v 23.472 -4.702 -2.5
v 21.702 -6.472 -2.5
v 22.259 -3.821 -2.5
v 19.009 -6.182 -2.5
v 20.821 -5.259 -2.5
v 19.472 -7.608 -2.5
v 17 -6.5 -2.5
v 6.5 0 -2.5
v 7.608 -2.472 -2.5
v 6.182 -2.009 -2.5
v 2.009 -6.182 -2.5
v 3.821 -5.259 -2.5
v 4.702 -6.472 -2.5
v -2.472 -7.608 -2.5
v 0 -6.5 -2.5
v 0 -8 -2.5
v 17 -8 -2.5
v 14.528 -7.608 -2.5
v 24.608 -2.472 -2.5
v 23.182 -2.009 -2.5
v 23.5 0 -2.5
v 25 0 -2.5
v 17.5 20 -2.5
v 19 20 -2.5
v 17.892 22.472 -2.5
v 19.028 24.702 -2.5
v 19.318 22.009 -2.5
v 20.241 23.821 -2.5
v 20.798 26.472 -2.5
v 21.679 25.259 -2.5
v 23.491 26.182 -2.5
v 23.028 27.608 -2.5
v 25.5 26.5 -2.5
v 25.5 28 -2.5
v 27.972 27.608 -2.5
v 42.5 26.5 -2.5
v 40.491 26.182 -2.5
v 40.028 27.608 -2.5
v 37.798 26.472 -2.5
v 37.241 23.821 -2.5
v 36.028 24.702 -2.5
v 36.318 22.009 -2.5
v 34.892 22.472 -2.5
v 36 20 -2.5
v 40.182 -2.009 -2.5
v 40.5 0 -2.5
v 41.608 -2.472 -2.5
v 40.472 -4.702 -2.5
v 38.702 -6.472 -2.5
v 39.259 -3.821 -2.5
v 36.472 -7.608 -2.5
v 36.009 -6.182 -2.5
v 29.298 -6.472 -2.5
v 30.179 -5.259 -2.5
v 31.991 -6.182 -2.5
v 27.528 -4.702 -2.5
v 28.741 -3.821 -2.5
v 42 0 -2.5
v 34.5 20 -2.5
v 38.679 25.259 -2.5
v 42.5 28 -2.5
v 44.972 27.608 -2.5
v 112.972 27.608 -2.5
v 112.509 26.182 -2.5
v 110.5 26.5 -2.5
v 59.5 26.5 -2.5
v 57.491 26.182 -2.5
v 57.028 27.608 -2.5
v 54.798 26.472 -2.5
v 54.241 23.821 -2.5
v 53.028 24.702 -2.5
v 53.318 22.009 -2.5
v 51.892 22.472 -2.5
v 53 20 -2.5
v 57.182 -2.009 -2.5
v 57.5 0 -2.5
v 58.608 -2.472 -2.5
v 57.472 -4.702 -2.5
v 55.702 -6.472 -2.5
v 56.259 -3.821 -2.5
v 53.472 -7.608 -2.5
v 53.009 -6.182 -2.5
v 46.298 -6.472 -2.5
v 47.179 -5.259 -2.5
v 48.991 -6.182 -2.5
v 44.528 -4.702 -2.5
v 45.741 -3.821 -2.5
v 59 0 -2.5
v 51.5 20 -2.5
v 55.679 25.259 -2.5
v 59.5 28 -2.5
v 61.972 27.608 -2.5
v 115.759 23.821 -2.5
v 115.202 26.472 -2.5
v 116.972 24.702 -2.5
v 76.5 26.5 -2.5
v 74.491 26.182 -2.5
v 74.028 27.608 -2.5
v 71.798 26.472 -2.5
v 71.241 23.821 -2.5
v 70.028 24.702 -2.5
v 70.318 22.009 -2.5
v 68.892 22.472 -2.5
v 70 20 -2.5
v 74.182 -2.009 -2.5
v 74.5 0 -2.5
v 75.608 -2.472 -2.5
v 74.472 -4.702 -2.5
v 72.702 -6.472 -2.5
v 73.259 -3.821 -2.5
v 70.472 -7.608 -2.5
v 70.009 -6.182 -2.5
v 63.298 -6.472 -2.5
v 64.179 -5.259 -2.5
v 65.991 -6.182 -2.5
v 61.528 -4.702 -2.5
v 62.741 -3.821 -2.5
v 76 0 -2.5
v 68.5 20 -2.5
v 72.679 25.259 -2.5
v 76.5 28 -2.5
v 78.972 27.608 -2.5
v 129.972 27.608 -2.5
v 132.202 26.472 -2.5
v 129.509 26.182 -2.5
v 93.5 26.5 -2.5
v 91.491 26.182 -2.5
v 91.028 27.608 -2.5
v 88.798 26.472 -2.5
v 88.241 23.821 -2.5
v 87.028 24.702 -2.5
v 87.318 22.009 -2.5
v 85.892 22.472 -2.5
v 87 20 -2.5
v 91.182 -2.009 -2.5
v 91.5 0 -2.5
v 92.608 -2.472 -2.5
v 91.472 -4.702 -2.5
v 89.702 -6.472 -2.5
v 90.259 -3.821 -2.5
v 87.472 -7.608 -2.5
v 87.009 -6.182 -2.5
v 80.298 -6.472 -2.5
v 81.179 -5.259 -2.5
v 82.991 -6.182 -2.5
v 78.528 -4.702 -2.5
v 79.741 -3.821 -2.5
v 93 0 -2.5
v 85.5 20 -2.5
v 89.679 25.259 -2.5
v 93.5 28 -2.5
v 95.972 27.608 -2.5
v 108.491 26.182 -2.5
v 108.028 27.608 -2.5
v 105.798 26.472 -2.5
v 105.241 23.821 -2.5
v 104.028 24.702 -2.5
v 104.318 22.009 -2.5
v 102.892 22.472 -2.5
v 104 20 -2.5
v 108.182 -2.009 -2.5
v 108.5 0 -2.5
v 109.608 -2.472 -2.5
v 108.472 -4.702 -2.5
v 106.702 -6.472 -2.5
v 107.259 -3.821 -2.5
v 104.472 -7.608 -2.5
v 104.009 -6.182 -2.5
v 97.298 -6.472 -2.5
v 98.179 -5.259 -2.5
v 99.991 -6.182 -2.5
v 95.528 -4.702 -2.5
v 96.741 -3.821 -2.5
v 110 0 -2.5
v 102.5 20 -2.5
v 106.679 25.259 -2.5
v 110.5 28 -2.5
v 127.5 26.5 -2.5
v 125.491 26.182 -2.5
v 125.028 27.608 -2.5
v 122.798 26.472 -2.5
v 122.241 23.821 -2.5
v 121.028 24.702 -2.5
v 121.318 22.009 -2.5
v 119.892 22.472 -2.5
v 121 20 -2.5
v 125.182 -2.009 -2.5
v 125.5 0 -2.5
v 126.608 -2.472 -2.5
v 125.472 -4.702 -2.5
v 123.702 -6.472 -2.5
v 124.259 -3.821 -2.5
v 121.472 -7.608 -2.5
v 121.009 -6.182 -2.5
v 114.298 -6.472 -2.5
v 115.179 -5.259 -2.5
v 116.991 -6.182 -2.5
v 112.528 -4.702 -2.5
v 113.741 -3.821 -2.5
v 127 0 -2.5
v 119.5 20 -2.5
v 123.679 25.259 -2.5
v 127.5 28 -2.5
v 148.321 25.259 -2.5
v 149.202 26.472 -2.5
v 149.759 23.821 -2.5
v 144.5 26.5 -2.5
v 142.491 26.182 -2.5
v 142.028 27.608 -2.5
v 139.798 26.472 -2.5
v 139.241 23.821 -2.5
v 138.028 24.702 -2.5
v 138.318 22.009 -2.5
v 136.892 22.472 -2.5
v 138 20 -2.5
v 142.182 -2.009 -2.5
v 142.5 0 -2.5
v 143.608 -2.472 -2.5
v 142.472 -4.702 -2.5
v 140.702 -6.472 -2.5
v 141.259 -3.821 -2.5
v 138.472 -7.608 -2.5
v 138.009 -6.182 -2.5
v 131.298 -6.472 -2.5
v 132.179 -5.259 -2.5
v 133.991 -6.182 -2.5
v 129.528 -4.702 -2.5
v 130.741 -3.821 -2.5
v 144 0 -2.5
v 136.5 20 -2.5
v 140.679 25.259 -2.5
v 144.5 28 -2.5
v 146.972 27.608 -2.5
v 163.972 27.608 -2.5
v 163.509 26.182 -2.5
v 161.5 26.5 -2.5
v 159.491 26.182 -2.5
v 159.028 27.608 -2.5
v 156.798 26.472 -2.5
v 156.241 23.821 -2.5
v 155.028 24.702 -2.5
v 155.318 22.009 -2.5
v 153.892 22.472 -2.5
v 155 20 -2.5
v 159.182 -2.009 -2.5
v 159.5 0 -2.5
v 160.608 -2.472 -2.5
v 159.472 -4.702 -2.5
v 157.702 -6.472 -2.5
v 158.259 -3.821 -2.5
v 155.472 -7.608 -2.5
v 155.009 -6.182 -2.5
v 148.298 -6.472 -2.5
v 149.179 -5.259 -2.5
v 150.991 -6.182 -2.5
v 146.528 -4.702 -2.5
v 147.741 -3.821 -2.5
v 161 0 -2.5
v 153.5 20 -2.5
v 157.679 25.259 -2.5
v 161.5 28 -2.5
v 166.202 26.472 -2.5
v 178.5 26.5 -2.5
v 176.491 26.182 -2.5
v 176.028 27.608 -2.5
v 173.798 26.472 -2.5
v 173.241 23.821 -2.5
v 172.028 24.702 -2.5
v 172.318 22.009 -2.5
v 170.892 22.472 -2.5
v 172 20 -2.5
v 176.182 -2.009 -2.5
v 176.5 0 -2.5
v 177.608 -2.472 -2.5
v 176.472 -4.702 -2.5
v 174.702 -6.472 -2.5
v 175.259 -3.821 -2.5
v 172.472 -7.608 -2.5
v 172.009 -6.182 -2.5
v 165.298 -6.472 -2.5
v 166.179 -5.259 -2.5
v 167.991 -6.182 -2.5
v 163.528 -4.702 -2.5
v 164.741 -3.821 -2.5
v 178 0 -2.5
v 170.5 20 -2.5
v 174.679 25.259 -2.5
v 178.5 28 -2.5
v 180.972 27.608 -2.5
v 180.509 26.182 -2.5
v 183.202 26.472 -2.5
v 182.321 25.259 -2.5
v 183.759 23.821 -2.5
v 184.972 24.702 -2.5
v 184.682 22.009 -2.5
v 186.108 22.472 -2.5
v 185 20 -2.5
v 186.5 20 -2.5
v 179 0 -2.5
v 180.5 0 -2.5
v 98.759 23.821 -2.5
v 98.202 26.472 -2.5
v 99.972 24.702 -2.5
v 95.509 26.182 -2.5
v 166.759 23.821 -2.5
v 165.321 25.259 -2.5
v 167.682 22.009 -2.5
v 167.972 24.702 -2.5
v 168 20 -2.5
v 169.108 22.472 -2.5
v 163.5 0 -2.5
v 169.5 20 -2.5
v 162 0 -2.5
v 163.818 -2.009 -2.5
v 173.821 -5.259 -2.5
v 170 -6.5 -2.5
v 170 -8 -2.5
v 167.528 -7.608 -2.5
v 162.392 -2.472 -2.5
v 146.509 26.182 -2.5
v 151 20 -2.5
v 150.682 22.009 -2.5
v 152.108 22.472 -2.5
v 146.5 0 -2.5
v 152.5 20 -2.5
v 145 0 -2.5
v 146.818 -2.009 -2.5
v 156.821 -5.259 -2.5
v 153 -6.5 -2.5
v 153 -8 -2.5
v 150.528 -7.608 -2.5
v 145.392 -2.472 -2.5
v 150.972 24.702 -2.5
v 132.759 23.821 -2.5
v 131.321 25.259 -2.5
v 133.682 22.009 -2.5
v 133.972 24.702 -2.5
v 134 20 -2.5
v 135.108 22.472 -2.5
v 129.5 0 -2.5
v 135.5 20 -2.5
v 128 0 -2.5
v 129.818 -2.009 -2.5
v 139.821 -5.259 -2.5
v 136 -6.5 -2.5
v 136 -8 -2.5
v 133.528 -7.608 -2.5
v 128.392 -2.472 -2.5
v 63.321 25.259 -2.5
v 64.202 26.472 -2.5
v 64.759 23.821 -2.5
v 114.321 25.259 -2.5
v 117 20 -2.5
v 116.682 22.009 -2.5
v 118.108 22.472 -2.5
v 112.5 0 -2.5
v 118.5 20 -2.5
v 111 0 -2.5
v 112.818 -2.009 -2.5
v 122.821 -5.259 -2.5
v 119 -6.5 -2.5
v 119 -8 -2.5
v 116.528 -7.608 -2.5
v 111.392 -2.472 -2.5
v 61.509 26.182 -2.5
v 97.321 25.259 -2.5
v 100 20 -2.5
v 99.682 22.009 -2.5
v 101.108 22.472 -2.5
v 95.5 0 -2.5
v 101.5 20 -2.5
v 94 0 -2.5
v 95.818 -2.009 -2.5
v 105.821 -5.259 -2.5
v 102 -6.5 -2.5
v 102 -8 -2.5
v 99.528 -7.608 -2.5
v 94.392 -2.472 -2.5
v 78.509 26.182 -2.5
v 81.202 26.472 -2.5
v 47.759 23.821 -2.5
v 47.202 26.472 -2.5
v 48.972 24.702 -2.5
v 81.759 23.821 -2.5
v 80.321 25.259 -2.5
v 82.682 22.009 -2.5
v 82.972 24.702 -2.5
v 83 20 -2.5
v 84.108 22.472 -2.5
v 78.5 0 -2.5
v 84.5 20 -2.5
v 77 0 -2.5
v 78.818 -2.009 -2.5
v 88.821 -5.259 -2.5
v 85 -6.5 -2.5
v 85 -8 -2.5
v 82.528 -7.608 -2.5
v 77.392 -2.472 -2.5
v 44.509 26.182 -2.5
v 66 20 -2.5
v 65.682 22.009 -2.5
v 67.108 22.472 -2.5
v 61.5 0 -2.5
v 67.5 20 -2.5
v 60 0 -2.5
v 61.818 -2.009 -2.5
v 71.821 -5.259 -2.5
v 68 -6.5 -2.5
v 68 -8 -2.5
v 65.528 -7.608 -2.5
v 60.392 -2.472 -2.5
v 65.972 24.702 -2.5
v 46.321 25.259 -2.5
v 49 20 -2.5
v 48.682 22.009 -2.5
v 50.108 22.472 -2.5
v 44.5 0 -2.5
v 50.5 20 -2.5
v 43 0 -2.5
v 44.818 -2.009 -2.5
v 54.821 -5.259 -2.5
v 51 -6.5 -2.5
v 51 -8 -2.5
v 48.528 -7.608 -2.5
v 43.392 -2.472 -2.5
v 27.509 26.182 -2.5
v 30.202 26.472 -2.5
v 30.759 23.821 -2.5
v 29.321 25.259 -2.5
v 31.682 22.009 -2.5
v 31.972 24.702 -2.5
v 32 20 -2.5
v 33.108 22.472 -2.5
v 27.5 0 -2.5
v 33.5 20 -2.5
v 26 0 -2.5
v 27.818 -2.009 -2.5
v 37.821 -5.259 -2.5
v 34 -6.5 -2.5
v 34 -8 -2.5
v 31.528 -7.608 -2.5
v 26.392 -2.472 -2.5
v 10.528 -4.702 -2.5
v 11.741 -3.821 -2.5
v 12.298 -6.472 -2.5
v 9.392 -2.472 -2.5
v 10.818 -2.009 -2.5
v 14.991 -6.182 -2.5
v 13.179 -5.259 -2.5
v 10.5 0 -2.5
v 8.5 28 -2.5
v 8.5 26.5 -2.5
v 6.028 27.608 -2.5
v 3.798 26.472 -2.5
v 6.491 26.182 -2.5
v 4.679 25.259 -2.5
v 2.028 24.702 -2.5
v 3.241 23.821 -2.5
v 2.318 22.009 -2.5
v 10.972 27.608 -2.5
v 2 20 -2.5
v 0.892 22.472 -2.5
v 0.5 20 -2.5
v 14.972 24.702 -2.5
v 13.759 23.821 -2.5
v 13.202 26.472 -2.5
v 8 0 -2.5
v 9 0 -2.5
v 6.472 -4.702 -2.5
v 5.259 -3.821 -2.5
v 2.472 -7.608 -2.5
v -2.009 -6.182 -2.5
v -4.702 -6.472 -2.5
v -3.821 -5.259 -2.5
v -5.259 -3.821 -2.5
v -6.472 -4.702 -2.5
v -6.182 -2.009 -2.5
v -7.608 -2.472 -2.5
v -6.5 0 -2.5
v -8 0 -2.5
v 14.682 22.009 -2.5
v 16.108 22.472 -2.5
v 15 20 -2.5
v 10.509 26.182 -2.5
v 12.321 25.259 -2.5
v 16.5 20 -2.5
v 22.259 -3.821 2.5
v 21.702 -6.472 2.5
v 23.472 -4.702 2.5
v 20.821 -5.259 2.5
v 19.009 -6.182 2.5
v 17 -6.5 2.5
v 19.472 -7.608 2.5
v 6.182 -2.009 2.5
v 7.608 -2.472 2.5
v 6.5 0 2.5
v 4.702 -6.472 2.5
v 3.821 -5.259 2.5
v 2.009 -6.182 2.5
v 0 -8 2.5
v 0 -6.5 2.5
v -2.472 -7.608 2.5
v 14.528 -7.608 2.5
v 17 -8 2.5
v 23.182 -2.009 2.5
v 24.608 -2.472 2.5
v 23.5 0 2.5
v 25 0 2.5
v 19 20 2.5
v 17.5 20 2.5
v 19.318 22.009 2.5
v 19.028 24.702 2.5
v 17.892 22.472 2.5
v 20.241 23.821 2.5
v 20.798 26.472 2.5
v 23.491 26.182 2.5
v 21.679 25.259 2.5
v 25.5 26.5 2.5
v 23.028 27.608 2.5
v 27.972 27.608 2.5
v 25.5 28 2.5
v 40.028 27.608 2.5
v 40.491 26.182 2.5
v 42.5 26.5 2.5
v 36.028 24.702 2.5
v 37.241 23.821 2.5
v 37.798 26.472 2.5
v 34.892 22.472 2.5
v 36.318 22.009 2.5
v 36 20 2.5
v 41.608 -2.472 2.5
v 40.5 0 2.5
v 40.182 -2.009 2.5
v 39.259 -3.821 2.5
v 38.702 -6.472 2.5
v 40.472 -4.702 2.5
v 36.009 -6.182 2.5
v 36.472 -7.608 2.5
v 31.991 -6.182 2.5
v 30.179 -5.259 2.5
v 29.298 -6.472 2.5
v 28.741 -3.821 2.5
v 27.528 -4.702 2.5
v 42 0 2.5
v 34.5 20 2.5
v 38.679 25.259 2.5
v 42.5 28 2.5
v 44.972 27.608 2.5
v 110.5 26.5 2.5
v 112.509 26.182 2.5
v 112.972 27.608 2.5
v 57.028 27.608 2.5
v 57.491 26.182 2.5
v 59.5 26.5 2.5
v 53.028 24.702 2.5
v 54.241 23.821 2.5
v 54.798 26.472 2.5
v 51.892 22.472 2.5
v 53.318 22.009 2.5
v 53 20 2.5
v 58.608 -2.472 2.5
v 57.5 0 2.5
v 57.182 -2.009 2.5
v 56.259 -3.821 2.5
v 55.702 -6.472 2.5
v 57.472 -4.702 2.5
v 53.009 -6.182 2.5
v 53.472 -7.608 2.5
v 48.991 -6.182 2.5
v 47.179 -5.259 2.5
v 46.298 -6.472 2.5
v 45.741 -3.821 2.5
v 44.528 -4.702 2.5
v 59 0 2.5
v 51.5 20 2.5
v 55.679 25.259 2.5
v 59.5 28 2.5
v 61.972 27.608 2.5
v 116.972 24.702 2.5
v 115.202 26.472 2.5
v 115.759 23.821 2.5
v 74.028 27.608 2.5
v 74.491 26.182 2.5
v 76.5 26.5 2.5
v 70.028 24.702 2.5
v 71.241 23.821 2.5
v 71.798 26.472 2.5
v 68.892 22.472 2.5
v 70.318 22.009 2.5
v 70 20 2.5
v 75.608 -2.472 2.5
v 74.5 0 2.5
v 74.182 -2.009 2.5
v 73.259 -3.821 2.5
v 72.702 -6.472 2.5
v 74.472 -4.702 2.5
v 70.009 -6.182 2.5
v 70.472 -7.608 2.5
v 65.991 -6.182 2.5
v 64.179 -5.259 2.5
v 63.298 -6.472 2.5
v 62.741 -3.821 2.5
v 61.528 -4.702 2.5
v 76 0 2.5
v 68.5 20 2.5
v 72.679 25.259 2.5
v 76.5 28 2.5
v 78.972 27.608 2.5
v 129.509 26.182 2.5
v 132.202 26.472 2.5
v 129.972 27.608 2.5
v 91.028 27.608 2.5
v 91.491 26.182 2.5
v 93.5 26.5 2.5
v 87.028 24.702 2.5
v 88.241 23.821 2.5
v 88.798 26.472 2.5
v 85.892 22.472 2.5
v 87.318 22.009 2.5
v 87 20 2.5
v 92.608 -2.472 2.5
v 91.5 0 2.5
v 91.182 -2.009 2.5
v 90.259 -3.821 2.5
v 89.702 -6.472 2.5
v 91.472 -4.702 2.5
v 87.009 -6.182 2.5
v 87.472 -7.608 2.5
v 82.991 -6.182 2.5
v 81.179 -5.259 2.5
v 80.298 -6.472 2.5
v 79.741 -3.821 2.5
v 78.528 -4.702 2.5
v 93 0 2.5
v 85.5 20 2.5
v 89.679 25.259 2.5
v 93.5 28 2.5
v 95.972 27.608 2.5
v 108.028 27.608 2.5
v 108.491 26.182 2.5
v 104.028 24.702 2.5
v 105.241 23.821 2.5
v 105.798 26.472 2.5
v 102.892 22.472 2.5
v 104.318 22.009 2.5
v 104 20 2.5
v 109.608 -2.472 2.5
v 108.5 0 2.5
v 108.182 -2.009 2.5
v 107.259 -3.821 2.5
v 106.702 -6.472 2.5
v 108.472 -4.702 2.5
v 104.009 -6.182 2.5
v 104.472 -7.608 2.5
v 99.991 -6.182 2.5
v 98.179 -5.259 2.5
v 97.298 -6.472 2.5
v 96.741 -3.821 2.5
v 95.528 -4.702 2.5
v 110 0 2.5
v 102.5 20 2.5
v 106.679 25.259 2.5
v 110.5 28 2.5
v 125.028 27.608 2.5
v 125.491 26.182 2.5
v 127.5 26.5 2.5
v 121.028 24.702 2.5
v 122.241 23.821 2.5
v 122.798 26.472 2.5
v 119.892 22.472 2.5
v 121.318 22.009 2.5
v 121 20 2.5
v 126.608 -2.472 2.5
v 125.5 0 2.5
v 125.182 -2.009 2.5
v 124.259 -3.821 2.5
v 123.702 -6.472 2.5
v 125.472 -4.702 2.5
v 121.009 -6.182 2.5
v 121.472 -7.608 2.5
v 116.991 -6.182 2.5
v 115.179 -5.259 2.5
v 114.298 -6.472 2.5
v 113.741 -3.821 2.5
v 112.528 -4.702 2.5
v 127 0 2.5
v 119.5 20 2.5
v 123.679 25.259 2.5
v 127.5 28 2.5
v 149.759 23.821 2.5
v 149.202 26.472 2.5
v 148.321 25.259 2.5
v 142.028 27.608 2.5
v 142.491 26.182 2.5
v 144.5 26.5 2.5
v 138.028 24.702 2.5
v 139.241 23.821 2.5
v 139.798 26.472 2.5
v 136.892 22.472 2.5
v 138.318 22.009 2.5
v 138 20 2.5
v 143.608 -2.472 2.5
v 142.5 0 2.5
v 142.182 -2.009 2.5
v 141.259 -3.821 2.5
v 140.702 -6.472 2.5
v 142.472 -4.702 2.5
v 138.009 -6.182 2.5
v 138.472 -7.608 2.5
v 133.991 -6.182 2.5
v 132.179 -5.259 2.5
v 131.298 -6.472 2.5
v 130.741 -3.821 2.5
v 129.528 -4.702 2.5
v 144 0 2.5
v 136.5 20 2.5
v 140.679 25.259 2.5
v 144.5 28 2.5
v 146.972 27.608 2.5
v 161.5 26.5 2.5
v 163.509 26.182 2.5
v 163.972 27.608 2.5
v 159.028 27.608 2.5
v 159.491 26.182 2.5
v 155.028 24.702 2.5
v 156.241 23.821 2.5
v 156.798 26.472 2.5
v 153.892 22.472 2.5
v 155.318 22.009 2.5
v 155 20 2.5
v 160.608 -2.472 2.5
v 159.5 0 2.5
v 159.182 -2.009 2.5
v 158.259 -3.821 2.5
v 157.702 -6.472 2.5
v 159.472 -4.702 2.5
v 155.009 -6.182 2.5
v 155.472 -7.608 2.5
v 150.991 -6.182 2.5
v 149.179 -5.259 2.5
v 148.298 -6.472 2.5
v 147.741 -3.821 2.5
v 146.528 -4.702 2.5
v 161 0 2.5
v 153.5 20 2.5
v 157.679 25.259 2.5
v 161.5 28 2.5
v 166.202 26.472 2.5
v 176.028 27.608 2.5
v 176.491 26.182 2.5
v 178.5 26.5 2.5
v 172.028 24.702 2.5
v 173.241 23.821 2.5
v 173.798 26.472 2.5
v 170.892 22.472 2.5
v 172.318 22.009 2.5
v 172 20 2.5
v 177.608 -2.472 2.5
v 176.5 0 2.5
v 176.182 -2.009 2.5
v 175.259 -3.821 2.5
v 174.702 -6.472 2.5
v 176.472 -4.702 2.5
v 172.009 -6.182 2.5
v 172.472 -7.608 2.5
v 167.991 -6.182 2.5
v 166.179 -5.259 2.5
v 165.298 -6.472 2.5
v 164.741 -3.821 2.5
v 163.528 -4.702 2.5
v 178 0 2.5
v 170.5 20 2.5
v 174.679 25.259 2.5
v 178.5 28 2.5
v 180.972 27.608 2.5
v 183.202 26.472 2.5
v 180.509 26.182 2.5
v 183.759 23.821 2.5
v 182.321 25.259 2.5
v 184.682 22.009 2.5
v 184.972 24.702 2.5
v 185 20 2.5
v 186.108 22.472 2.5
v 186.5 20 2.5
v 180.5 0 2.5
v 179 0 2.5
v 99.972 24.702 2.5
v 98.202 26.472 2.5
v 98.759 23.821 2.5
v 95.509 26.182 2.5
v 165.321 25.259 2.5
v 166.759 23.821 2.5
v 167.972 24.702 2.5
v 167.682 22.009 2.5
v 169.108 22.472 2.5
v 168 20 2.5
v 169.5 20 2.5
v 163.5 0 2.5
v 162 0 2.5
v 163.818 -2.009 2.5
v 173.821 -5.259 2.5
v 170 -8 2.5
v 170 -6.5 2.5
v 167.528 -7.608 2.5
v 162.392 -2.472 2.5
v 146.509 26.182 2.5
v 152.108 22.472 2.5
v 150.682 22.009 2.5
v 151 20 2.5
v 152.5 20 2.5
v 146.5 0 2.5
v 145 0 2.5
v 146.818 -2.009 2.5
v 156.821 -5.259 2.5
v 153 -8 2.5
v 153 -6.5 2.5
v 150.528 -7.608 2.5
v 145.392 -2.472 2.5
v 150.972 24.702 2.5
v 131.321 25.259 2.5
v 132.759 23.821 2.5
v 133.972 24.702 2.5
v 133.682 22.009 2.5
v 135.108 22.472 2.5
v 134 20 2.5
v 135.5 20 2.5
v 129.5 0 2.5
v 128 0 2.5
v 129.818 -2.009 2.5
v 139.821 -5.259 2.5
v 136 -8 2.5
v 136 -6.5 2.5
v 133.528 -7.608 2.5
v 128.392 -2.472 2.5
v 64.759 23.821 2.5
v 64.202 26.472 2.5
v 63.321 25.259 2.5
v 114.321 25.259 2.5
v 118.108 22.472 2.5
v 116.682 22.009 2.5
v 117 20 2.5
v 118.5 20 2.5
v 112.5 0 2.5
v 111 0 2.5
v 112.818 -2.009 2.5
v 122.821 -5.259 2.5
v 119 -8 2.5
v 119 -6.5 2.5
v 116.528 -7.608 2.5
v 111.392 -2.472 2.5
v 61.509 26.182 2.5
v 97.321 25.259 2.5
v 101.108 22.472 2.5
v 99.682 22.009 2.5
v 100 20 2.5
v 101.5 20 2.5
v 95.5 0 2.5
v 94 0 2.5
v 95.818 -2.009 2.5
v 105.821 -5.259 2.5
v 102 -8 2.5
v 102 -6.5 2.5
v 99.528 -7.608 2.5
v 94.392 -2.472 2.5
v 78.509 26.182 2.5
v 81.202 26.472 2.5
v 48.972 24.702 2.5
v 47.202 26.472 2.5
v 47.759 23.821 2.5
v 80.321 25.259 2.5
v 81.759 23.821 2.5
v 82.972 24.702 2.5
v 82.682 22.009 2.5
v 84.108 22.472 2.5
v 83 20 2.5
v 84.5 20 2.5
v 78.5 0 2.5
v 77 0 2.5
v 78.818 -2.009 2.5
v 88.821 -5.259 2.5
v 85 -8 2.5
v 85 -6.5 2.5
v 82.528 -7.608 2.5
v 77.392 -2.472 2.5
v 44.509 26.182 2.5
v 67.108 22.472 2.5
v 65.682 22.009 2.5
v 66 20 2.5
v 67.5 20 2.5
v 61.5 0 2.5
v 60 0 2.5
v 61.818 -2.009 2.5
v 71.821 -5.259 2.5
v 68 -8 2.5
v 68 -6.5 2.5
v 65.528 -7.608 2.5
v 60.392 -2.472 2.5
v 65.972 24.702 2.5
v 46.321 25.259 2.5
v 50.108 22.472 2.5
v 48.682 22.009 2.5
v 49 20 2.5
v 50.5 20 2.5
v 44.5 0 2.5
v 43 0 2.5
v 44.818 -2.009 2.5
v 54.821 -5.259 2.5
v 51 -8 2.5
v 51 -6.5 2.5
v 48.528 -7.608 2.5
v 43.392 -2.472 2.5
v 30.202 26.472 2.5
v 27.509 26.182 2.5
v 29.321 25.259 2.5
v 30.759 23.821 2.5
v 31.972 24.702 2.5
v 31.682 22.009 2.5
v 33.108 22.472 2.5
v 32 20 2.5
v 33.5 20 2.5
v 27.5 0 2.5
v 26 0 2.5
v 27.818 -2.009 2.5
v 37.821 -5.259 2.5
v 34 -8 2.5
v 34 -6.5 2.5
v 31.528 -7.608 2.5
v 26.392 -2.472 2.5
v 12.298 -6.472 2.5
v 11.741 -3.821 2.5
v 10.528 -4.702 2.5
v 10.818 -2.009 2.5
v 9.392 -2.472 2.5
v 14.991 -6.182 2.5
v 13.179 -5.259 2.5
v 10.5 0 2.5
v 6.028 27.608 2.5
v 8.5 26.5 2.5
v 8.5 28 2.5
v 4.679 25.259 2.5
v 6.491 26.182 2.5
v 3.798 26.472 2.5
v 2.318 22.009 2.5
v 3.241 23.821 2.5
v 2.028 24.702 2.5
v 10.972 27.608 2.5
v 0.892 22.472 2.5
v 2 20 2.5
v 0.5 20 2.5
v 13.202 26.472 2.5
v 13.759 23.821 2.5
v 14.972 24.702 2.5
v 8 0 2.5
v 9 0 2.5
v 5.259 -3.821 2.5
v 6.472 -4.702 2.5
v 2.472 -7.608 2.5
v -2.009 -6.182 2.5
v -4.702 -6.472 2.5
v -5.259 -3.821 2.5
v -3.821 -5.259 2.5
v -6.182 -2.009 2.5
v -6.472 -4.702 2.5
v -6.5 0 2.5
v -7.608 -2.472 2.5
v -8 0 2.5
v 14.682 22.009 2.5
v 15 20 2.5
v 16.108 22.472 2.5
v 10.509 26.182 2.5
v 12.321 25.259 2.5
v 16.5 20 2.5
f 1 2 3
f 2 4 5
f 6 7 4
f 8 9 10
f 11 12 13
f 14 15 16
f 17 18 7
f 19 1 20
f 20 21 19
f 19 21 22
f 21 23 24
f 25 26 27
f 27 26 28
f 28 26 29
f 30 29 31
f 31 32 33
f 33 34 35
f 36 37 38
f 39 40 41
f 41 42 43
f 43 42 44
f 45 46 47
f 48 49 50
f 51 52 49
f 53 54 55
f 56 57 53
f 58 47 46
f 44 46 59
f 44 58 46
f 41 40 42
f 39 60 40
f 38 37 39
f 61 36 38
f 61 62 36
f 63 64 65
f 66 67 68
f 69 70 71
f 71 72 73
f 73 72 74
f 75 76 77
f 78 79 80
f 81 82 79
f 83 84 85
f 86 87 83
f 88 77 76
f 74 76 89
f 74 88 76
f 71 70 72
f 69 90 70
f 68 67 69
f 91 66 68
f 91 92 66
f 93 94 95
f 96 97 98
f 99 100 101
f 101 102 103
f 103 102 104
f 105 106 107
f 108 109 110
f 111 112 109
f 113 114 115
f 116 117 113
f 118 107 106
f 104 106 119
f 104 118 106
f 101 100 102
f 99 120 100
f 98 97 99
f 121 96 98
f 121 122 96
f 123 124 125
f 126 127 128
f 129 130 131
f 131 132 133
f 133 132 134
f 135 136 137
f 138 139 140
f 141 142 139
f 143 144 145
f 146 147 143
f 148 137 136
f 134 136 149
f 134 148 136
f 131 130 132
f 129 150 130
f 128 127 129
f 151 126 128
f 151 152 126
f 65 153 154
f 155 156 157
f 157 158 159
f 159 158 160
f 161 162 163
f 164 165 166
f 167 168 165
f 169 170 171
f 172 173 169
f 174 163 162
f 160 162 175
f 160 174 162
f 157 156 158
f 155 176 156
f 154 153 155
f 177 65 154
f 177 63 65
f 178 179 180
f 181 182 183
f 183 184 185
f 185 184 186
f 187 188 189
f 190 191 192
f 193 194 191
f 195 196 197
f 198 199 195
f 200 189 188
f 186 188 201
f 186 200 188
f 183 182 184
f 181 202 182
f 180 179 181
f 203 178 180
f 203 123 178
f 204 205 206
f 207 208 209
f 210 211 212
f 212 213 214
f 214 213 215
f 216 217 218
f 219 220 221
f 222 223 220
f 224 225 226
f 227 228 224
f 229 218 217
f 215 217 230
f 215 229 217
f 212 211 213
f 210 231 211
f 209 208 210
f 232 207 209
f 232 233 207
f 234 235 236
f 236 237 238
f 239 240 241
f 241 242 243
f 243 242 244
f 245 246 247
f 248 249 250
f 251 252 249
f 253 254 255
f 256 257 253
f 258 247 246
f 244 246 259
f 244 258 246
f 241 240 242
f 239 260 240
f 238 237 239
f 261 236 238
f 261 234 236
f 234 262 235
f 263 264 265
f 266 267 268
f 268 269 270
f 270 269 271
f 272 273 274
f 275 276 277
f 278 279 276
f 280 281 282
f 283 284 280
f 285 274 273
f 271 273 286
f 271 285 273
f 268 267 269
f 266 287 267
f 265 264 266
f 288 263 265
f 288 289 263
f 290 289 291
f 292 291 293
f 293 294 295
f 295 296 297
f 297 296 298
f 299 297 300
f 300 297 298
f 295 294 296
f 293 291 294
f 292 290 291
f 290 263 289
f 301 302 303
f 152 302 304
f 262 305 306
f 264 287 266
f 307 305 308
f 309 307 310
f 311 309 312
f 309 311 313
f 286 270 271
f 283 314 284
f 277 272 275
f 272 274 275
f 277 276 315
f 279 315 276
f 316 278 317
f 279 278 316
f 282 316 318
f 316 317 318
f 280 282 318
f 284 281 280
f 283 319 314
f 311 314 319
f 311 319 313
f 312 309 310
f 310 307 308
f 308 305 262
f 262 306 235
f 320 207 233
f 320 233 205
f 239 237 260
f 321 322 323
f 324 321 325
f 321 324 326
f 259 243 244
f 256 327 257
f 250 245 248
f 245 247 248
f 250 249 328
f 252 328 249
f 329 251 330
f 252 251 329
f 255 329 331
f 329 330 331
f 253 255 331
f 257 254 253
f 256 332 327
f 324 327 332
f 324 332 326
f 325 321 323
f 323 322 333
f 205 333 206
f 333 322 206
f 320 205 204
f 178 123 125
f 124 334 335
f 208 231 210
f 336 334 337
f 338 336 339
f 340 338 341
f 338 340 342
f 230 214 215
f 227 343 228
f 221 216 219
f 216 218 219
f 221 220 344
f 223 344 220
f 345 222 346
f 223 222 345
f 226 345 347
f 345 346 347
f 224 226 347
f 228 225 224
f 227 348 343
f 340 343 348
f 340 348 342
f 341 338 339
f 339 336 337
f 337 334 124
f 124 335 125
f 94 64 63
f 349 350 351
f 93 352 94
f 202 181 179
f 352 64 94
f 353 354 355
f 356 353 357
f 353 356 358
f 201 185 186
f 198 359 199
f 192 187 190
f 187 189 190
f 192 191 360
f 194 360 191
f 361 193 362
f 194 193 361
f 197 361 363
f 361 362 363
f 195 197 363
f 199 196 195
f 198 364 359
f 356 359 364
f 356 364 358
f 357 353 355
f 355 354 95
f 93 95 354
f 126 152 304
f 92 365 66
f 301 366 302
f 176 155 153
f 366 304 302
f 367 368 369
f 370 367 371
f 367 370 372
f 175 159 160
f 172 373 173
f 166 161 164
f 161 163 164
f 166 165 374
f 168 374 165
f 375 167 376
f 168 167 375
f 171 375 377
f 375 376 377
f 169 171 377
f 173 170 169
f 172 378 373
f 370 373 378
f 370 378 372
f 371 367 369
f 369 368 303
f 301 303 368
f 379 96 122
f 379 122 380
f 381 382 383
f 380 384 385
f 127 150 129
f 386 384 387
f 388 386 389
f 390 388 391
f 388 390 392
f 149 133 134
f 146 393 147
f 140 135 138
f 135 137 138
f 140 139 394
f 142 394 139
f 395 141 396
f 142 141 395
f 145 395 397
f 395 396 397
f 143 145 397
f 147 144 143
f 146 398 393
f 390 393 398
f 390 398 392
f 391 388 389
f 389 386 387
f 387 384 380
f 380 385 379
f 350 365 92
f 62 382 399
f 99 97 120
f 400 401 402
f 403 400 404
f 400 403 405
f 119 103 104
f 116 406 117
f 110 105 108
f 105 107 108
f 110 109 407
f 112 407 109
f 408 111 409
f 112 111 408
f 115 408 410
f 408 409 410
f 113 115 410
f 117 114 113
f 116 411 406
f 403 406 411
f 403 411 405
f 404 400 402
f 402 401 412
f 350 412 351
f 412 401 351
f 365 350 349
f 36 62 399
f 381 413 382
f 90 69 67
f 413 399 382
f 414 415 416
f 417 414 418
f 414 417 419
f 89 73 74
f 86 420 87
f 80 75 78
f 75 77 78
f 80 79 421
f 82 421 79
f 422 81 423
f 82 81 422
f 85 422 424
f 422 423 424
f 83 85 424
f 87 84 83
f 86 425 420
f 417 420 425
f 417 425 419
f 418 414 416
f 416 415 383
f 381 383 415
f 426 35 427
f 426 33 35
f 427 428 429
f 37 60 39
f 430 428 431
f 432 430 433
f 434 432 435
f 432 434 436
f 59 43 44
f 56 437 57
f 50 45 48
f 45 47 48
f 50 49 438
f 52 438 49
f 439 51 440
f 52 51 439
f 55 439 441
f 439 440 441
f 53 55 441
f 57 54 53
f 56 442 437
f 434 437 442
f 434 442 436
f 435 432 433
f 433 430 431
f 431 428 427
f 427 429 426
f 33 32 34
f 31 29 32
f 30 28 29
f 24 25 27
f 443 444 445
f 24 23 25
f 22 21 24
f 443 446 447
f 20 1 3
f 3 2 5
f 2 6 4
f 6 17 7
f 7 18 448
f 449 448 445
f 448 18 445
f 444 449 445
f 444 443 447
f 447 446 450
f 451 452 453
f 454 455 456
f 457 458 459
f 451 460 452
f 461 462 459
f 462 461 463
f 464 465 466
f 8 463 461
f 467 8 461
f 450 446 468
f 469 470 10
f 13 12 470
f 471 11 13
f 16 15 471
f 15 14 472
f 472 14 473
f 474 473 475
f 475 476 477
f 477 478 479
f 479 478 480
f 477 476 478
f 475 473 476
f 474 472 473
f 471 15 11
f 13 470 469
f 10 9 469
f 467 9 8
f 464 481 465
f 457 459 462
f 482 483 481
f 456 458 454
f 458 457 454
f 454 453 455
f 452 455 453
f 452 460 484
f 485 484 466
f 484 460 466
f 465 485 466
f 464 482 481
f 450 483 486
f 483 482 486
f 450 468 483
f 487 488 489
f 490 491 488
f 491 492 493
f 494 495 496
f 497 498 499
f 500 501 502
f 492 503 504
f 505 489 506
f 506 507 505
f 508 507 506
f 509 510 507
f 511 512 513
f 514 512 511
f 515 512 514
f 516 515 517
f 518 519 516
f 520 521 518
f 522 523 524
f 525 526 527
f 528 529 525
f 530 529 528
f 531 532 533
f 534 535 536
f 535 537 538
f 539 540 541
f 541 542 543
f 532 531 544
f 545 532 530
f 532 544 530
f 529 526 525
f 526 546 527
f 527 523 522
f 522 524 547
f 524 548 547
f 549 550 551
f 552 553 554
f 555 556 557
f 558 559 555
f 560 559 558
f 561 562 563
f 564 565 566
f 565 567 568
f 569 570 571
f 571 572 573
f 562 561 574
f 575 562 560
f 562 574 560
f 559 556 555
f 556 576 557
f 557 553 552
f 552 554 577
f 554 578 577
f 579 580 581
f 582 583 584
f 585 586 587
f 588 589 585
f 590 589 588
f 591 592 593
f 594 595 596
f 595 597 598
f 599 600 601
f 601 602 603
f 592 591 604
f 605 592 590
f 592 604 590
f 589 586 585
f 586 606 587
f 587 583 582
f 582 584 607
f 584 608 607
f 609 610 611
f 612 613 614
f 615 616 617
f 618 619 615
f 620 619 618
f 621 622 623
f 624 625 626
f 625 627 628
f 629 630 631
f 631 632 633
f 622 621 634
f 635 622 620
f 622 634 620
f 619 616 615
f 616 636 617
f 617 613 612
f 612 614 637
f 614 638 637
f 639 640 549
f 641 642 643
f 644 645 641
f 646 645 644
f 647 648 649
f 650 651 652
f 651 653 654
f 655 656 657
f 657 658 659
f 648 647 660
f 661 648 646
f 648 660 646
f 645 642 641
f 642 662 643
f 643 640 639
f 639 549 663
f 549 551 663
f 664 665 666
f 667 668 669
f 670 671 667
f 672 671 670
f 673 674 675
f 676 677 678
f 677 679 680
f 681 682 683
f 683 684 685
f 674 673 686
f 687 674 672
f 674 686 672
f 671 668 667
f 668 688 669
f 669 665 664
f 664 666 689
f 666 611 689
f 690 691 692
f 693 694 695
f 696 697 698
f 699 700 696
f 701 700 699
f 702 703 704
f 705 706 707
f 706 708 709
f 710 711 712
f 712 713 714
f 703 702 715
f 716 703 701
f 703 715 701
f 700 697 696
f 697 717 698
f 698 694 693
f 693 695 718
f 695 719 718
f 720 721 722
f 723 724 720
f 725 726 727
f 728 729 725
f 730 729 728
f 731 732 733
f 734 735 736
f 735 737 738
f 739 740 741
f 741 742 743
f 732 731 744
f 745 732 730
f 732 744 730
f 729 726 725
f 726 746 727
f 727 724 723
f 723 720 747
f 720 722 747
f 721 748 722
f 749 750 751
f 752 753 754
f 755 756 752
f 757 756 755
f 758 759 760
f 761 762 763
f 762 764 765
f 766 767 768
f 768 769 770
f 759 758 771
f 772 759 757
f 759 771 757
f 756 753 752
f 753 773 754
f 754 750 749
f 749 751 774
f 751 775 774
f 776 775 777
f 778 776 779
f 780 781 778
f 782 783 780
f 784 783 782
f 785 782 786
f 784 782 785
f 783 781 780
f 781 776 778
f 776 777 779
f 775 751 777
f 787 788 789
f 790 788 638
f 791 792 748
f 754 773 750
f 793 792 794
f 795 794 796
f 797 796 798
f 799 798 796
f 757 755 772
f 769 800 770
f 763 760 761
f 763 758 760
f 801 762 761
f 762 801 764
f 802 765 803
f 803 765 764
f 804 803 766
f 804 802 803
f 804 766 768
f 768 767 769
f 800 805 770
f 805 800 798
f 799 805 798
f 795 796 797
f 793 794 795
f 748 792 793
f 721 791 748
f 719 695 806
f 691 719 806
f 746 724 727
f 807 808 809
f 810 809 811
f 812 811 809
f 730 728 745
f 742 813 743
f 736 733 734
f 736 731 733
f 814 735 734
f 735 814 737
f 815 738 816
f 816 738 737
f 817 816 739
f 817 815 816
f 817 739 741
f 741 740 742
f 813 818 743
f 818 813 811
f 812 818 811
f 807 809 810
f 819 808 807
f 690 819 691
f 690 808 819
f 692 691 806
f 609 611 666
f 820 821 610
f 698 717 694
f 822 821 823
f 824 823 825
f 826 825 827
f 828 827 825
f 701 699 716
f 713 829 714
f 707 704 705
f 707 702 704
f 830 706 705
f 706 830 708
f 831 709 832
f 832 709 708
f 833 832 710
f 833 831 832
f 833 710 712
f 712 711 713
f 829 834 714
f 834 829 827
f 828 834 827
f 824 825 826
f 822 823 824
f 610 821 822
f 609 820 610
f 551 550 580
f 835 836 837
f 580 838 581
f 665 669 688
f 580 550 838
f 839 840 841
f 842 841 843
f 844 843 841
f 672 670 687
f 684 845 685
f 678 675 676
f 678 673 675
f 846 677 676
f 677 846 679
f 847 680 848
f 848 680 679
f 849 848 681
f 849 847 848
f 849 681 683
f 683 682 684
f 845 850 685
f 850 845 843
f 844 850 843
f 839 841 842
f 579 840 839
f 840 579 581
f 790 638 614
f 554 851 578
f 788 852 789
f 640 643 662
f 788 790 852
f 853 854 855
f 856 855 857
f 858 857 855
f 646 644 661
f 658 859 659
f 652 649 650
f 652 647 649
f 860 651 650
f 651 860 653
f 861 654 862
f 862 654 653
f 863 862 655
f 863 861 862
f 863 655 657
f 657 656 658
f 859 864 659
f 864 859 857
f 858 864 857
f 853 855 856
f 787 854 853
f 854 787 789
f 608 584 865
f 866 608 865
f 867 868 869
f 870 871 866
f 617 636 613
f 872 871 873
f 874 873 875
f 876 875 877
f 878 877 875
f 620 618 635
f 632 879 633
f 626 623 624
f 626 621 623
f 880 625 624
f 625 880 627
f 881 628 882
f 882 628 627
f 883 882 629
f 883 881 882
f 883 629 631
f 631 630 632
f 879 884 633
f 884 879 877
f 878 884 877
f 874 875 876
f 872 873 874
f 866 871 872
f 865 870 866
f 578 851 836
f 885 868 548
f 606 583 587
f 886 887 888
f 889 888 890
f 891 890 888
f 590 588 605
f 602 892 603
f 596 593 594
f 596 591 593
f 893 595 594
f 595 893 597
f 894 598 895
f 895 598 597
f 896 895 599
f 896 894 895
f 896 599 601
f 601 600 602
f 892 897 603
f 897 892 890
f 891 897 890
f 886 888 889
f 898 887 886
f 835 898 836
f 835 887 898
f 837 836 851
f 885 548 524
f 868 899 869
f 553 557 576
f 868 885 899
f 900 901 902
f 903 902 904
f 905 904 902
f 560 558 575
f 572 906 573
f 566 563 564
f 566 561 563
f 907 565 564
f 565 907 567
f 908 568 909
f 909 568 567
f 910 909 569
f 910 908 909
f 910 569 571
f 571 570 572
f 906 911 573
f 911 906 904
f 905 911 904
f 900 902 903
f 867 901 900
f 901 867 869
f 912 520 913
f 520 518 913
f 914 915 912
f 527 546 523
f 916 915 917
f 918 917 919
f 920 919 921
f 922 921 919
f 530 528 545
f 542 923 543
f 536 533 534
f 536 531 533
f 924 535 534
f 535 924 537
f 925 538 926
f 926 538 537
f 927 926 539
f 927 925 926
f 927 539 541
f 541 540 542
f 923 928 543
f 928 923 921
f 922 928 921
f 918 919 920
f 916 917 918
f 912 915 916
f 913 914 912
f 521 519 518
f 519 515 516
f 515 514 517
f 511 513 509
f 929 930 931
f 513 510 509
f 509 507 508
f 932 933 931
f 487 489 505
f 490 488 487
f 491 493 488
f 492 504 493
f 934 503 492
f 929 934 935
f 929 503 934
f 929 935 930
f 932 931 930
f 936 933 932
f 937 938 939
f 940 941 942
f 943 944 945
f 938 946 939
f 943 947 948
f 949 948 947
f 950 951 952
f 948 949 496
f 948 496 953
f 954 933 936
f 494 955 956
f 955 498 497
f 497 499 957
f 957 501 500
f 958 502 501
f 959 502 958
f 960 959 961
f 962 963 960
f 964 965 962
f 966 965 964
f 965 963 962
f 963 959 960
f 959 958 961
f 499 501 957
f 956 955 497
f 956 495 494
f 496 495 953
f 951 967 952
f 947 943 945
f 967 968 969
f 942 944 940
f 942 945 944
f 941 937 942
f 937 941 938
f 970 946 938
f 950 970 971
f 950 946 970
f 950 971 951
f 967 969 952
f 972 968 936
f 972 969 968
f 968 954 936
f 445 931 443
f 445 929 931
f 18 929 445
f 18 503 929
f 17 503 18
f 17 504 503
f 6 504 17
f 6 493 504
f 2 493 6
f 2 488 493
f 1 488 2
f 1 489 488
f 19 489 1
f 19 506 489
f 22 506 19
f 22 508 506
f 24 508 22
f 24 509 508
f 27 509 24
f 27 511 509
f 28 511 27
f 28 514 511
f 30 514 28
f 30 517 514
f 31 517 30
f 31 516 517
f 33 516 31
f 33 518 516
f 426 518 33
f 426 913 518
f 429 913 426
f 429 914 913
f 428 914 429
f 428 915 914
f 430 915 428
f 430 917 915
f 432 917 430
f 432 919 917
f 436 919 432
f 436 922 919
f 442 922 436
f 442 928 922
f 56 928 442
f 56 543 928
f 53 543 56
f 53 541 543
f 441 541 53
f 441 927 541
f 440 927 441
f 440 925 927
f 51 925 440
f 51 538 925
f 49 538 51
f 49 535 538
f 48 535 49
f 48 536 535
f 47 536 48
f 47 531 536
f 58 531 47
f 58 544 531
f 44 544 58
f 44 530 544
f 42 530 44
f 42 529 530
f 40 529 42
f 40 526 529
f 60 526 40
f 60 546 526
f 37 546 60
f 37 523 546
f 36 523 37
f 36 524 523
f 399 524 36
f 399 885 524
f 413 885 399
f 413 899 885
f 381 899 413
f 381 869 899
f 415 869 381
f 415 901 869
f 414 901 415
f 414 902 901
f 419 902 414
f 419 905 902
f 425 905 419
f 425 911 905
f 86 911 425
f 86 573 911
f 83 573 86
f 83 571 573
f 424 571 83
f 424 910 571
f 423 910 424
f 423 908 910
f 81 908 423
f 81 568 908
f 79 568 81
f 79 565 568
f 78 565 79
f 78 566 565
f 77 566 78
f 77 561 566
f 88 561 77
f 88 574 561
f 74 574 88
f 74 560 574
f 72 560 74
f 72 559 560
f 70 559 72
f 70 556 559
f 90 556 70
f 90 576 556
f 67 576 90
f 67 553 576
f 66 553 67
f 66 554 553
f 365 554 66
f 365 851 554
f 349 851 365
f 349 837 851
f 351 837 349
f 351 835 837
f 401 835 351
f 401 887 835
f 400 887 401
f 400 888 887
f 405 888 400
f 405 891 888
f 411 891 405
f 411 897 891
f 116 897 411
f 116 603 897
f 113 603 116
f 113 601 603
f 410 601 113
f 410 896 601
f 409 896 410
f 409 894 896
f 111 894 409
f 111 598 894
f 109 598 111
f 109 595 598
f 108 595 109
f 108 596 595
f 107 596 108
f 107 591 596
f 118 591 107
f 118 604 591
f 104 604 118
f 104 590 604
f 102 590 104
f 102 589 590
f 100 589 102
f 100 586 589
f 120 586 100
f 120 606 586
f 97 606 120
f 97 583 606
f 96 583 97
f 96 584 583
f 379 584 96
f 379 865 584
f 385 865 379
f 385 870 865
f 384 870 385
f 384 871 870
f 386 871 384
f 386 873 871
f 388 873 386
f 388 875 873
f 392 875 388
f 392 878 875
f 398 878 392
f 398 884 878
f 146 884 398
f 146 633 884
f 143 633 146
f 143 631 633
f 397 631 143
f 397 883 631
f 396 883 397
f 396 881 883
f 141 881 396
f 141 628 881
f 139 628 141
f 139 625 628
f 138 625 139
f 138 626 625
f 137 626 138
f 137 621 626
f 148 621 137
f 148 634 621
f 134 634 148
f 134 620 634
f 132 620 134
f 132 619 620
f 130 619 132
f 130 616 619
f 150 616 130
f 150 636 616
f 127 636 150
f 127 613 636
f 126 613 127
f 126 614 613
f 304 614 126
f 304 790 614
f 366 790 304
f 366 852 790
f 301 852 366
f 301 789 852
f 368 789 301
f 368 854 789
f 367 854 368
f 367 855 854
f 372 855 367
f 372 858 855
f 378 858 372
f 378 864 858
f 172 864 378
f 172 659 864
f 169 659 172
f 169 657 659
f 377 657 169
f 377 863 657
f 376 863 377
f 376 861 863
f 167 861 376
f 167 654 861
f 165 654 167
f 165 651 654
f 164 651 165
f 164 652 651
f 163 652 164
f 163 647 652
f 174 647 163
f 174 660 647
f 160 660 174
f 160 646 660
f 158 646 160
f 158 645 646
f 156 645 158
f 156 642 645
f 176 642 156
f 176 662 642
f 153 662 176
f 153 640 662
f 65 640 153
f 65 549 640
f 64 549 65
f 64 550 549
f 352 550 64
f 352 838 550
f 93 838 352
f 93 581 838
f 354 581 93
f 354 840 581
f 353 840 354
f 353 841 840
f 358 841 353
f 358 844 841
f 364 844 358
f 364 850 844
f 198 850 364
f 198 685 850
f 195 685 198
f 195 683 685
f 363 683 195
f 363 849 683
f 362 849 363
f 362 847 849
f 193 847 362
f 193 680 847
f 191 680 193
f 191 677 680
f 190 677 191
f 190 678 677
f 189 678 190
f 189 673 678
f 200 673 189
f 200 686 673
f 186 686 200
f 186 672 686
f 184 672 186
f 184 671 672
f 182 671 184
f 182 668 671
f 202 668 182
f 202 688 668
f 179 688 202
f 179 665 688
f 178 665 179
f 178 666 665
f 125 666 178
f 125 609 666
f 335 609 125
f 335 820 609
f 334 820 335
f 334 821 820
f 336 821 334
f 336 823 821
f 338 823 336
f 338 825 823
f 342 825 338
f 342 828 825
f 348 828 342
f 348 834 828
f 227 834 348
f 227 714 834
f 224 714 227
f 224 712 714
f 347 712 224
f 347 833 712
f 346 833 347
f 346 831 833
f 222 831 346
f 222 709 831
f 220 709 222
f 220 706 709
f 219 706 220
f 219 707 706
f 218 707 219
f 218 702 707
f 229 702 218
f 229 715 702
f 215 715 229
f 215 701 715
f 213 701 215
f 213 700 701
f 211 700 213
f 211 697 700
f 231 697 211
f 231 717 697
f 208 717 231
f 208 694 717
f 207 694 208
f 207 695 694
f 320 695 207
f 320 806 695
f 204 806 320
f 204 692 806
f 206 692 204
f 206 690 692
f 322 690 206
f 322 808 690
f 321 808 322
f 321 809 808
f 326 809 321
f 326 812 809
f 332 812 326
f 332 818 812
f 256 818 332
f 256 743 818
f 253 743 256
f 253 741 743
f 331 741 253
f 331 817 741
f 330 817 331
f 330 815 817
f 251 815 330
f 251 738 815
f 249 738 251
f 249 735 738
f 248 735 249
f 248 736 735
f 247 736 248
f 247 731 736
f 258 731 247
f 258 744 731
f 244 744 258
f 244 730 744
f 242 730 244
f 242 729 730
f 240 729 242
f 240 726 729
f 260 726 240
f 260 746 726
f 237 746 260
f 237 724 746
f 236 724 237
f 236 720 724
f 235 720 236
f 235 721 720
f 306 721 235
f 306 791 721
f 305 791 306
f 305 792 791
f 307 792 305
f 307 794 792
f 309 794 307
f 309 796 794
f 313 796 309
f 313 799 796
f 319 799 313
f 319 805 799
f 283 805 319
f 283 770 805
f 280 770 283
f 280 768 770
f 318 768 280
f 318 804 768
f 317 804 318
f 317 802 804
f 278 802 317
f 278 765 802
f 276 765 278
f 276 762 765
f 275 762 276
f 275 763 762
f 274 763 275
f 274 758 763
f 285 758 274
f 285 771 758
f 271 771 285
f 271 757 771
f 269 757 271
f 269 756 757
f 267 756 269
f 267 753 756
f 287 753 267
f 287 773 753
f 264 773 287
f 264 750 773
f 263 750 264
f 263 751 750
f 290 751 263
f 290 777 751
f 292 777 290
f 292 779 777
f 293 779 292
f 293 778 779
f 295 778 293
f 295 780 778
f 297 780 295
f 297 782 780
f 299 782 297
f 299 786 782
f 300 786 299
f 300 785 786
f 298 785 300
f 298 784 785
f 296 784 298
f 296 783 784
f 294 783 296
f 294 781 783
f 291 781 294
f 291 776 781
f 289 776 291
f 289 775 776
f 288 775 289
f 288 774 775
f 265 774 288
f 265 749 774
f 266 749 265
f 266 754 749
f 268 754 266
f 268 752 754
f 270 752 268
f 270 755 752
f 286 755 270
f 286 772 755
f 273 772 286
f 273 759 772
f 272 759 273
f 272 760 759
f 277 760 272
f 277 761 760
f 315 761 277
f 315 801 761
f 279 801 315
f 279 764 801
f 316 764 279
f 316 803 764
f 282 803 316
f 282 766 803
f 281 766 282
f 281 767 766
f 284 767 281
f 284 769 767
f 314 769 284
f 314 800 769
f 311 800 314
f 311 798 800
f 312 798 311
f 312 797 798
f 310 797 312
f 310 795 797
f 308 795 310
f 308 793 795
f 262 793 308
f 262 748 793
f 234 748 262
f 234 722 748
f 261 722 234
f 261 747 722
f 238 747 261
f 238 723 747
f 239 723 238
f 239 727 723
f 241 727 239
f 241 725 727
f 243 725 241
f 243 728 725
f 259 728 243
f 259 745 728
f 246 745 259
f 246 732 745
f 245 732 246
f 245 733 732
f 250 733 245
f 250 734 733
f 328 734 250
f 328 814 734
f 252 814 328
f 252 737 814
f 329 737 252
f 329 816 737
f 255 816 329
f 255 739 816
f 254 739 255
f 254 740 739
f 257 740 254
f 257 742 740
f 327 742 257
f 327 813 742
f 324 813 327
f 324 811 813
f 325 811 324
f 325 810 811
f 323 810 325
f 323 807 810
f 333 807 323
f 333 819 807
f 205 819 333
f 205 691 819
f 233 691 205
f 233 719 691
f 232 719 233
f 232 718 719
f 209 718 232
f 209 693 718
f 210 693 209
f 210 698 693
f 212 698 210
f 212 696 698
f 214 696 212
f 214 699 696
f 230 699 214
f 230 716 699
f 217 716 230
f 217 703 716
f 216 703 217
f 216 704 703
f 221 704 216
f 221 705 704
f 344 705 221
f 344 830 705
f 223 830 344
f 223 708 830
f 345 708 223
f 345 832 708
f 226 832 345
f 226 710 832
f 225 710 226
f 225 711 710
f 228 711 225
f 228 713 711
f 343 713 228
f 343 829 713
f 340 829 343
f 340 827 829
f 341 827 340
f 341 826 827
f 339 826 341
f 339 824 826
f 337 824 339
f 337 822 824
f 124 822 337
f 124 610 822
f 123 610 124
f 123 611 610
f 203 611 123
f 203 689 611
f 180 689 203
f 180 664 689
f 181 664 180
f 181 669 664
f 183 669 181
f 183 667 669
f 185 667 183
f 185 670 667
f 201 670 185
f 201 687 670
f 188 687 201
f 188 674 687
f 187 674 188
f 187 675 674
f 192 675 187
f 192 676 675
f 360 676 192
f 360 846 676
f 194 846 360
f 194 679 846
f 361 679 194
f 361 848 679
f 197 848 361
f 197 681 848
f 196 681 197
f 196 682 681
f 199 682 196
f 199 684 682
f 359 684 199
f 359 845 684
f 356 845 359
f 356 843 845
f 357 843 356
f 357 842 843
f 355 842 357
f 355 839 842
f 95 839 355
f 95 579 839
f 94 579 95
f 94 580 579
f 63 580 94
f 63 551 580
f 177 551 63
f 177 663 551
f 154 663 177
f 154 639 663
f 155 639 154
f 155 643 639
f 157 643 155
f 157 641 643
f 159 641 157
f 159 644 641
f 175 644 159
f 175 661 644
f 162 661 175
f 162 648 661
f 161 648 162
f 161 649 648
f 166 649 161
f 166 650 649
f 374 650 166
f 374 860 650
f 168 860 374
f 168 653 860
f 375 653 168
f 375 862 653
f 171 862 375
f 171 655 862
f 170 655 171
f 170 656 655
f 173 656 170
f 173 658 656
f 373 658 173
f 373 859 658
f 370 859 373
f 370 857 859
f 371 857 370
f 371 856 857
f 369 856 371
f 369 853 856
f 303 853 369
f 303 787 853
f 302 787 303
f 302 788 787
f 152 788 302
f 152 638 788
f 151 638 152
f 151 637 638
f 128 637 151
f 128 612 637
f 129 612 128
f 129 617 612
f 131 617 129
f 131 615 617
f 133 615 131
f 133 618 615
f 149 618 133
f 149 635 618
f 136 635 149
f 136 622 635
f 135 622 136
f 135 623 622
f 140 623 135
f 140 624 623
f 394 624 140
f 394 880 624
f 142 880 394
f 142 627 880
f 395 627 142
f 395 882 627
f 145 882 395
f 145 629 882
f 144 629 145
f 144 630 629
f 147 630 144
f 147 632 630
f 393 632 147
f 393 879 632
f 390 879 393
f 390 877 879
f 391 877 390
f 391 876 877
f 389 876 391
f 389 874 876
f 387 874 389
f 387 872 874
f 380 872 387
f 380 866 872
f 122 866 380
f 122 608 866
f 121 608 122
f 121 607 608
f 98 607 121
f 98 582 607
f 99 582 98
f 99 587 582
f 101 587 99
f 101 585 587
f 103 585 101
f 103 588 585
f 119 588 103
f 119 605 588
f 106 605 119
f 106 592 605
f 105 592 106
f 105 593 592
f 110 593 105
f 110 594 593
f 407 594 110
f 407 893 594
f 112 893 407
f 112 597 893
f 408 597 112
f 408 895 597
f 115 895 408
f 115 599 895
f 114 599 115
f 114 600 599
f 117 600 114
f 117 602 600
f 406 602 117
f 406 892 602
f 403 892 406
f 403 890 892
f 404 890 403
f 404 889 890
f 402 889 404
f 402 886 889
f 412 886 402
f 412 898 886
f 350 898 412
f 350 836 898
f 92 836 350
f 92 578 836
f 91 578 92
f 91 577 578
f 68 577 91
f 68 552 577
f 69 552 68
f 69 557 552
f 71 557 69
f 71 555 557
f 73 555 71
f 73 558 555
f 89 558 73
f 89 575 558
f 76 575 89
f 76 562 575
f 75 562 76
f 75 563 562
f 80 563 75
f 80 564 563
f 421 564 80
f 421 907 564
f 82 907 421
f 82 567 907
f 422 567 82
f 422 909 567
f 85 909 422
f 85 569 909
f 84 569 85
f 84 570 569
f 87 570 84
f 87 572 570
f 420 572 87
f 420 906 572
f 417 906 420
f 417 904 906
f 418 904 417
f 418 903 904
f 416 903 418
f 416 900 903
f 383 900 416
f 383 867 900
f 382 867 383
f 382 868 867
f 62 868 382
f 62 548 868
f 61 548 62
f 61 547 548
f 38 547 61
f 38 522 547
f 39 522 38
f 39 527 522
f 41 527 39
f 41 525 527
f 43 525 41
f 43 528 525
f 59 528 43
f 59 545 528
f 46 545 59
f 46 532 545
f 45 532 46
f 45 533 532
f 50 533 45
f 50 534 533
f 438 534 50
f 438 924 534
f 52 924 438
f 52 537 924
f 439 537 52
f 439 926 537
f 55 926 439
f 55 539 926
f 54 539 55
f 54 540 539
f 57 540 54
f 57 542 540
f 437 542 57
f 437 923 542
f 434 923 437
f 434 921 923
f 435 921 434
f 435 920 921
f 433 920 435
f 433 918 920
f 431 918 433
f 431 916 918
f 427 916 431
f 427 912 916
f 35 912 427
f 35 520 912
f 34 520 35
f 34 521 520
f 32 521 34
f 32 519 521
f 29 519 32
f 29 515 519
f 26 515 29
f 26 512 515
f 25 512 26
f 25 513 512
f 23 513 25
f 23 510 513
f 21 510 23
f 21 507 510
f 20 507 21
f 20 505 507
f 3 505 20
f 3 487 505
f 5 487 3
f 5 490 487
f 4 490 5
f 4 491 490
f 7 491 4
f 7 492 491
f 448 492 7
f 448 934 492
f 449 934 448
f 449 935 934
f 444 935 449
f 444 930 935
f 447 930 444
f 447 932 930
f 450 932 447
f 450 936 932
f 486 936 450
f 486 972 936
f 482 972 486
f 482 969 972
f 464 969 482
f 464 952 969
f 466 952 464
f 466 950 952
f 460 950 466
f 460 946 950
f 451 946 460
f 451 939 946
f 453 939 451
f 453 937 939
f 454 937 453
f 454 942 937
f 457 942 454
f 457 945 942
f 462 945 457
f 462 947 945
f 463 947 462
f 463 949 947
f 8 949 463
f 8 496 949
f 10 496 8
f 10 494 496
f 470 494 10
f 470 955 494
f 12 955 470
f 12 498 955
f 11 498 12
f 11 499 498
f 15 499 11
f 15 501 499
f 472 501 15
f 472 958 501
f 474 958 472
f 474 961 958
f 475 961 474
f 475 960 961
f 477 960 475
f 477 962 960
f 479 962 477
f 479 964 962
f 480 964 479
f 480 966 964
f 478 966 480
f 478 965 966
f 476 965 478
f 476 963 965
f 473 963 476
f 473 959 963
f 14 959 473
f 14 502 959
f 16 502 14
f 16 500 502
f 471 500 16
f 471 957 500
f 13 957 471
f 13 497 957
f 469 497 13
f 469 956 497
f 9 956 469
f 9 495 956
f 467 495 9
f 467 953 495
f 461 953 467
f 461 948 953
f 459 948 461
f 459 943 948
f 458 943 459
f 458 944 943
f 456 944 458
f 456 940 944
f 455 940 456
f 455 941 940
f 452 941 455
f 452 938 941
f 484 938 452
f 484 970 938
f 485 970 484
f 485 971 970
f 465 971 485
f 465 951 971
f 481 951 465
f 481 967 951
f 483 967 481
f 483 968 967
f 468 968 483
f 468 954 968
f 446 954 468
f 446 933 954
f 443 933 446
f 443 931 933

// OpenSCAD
thickness = 1.5;
r = 8;
span = 20;
scrunch = 6;
res = 20;
flaps = 10;
linear_extrude(height = 5, center = true, convexity = 10){
for (i = [0:1:flaps]){
    translate([i * (4 * r - 2 * scrunch - 2 * thickness), 0]){
        polygon(points = [ [r, 0], [r - scrunch, span], [r - scrunch - thickness, span], [r - thickness, 0] ]);
        difference(){
            circle(r, $fn=res);
            circle(r - thickness, $fn=res);
            translate([-r, 0]){
                square(2 * r);
            };
        }
        translate([2*r - thickness - scrunch, span]){
            difference(){
                difference(){
                    circle(r, $fn=res);
                    circle(r - thickness, $fn=res);
                };
                translate([-r, -2*r]){
                    square(2 * r);
                }
            }
        }
        polygon(points = [ [3 * r - 2 * thickness - scrunch, span], [3 * r - thickness - scrunch, span], [3 * r - 2 * scrunch - thickness, 0], [3 * r - 2 * scrunch - 2 * thickness, 0] ]);
    }
}
}
